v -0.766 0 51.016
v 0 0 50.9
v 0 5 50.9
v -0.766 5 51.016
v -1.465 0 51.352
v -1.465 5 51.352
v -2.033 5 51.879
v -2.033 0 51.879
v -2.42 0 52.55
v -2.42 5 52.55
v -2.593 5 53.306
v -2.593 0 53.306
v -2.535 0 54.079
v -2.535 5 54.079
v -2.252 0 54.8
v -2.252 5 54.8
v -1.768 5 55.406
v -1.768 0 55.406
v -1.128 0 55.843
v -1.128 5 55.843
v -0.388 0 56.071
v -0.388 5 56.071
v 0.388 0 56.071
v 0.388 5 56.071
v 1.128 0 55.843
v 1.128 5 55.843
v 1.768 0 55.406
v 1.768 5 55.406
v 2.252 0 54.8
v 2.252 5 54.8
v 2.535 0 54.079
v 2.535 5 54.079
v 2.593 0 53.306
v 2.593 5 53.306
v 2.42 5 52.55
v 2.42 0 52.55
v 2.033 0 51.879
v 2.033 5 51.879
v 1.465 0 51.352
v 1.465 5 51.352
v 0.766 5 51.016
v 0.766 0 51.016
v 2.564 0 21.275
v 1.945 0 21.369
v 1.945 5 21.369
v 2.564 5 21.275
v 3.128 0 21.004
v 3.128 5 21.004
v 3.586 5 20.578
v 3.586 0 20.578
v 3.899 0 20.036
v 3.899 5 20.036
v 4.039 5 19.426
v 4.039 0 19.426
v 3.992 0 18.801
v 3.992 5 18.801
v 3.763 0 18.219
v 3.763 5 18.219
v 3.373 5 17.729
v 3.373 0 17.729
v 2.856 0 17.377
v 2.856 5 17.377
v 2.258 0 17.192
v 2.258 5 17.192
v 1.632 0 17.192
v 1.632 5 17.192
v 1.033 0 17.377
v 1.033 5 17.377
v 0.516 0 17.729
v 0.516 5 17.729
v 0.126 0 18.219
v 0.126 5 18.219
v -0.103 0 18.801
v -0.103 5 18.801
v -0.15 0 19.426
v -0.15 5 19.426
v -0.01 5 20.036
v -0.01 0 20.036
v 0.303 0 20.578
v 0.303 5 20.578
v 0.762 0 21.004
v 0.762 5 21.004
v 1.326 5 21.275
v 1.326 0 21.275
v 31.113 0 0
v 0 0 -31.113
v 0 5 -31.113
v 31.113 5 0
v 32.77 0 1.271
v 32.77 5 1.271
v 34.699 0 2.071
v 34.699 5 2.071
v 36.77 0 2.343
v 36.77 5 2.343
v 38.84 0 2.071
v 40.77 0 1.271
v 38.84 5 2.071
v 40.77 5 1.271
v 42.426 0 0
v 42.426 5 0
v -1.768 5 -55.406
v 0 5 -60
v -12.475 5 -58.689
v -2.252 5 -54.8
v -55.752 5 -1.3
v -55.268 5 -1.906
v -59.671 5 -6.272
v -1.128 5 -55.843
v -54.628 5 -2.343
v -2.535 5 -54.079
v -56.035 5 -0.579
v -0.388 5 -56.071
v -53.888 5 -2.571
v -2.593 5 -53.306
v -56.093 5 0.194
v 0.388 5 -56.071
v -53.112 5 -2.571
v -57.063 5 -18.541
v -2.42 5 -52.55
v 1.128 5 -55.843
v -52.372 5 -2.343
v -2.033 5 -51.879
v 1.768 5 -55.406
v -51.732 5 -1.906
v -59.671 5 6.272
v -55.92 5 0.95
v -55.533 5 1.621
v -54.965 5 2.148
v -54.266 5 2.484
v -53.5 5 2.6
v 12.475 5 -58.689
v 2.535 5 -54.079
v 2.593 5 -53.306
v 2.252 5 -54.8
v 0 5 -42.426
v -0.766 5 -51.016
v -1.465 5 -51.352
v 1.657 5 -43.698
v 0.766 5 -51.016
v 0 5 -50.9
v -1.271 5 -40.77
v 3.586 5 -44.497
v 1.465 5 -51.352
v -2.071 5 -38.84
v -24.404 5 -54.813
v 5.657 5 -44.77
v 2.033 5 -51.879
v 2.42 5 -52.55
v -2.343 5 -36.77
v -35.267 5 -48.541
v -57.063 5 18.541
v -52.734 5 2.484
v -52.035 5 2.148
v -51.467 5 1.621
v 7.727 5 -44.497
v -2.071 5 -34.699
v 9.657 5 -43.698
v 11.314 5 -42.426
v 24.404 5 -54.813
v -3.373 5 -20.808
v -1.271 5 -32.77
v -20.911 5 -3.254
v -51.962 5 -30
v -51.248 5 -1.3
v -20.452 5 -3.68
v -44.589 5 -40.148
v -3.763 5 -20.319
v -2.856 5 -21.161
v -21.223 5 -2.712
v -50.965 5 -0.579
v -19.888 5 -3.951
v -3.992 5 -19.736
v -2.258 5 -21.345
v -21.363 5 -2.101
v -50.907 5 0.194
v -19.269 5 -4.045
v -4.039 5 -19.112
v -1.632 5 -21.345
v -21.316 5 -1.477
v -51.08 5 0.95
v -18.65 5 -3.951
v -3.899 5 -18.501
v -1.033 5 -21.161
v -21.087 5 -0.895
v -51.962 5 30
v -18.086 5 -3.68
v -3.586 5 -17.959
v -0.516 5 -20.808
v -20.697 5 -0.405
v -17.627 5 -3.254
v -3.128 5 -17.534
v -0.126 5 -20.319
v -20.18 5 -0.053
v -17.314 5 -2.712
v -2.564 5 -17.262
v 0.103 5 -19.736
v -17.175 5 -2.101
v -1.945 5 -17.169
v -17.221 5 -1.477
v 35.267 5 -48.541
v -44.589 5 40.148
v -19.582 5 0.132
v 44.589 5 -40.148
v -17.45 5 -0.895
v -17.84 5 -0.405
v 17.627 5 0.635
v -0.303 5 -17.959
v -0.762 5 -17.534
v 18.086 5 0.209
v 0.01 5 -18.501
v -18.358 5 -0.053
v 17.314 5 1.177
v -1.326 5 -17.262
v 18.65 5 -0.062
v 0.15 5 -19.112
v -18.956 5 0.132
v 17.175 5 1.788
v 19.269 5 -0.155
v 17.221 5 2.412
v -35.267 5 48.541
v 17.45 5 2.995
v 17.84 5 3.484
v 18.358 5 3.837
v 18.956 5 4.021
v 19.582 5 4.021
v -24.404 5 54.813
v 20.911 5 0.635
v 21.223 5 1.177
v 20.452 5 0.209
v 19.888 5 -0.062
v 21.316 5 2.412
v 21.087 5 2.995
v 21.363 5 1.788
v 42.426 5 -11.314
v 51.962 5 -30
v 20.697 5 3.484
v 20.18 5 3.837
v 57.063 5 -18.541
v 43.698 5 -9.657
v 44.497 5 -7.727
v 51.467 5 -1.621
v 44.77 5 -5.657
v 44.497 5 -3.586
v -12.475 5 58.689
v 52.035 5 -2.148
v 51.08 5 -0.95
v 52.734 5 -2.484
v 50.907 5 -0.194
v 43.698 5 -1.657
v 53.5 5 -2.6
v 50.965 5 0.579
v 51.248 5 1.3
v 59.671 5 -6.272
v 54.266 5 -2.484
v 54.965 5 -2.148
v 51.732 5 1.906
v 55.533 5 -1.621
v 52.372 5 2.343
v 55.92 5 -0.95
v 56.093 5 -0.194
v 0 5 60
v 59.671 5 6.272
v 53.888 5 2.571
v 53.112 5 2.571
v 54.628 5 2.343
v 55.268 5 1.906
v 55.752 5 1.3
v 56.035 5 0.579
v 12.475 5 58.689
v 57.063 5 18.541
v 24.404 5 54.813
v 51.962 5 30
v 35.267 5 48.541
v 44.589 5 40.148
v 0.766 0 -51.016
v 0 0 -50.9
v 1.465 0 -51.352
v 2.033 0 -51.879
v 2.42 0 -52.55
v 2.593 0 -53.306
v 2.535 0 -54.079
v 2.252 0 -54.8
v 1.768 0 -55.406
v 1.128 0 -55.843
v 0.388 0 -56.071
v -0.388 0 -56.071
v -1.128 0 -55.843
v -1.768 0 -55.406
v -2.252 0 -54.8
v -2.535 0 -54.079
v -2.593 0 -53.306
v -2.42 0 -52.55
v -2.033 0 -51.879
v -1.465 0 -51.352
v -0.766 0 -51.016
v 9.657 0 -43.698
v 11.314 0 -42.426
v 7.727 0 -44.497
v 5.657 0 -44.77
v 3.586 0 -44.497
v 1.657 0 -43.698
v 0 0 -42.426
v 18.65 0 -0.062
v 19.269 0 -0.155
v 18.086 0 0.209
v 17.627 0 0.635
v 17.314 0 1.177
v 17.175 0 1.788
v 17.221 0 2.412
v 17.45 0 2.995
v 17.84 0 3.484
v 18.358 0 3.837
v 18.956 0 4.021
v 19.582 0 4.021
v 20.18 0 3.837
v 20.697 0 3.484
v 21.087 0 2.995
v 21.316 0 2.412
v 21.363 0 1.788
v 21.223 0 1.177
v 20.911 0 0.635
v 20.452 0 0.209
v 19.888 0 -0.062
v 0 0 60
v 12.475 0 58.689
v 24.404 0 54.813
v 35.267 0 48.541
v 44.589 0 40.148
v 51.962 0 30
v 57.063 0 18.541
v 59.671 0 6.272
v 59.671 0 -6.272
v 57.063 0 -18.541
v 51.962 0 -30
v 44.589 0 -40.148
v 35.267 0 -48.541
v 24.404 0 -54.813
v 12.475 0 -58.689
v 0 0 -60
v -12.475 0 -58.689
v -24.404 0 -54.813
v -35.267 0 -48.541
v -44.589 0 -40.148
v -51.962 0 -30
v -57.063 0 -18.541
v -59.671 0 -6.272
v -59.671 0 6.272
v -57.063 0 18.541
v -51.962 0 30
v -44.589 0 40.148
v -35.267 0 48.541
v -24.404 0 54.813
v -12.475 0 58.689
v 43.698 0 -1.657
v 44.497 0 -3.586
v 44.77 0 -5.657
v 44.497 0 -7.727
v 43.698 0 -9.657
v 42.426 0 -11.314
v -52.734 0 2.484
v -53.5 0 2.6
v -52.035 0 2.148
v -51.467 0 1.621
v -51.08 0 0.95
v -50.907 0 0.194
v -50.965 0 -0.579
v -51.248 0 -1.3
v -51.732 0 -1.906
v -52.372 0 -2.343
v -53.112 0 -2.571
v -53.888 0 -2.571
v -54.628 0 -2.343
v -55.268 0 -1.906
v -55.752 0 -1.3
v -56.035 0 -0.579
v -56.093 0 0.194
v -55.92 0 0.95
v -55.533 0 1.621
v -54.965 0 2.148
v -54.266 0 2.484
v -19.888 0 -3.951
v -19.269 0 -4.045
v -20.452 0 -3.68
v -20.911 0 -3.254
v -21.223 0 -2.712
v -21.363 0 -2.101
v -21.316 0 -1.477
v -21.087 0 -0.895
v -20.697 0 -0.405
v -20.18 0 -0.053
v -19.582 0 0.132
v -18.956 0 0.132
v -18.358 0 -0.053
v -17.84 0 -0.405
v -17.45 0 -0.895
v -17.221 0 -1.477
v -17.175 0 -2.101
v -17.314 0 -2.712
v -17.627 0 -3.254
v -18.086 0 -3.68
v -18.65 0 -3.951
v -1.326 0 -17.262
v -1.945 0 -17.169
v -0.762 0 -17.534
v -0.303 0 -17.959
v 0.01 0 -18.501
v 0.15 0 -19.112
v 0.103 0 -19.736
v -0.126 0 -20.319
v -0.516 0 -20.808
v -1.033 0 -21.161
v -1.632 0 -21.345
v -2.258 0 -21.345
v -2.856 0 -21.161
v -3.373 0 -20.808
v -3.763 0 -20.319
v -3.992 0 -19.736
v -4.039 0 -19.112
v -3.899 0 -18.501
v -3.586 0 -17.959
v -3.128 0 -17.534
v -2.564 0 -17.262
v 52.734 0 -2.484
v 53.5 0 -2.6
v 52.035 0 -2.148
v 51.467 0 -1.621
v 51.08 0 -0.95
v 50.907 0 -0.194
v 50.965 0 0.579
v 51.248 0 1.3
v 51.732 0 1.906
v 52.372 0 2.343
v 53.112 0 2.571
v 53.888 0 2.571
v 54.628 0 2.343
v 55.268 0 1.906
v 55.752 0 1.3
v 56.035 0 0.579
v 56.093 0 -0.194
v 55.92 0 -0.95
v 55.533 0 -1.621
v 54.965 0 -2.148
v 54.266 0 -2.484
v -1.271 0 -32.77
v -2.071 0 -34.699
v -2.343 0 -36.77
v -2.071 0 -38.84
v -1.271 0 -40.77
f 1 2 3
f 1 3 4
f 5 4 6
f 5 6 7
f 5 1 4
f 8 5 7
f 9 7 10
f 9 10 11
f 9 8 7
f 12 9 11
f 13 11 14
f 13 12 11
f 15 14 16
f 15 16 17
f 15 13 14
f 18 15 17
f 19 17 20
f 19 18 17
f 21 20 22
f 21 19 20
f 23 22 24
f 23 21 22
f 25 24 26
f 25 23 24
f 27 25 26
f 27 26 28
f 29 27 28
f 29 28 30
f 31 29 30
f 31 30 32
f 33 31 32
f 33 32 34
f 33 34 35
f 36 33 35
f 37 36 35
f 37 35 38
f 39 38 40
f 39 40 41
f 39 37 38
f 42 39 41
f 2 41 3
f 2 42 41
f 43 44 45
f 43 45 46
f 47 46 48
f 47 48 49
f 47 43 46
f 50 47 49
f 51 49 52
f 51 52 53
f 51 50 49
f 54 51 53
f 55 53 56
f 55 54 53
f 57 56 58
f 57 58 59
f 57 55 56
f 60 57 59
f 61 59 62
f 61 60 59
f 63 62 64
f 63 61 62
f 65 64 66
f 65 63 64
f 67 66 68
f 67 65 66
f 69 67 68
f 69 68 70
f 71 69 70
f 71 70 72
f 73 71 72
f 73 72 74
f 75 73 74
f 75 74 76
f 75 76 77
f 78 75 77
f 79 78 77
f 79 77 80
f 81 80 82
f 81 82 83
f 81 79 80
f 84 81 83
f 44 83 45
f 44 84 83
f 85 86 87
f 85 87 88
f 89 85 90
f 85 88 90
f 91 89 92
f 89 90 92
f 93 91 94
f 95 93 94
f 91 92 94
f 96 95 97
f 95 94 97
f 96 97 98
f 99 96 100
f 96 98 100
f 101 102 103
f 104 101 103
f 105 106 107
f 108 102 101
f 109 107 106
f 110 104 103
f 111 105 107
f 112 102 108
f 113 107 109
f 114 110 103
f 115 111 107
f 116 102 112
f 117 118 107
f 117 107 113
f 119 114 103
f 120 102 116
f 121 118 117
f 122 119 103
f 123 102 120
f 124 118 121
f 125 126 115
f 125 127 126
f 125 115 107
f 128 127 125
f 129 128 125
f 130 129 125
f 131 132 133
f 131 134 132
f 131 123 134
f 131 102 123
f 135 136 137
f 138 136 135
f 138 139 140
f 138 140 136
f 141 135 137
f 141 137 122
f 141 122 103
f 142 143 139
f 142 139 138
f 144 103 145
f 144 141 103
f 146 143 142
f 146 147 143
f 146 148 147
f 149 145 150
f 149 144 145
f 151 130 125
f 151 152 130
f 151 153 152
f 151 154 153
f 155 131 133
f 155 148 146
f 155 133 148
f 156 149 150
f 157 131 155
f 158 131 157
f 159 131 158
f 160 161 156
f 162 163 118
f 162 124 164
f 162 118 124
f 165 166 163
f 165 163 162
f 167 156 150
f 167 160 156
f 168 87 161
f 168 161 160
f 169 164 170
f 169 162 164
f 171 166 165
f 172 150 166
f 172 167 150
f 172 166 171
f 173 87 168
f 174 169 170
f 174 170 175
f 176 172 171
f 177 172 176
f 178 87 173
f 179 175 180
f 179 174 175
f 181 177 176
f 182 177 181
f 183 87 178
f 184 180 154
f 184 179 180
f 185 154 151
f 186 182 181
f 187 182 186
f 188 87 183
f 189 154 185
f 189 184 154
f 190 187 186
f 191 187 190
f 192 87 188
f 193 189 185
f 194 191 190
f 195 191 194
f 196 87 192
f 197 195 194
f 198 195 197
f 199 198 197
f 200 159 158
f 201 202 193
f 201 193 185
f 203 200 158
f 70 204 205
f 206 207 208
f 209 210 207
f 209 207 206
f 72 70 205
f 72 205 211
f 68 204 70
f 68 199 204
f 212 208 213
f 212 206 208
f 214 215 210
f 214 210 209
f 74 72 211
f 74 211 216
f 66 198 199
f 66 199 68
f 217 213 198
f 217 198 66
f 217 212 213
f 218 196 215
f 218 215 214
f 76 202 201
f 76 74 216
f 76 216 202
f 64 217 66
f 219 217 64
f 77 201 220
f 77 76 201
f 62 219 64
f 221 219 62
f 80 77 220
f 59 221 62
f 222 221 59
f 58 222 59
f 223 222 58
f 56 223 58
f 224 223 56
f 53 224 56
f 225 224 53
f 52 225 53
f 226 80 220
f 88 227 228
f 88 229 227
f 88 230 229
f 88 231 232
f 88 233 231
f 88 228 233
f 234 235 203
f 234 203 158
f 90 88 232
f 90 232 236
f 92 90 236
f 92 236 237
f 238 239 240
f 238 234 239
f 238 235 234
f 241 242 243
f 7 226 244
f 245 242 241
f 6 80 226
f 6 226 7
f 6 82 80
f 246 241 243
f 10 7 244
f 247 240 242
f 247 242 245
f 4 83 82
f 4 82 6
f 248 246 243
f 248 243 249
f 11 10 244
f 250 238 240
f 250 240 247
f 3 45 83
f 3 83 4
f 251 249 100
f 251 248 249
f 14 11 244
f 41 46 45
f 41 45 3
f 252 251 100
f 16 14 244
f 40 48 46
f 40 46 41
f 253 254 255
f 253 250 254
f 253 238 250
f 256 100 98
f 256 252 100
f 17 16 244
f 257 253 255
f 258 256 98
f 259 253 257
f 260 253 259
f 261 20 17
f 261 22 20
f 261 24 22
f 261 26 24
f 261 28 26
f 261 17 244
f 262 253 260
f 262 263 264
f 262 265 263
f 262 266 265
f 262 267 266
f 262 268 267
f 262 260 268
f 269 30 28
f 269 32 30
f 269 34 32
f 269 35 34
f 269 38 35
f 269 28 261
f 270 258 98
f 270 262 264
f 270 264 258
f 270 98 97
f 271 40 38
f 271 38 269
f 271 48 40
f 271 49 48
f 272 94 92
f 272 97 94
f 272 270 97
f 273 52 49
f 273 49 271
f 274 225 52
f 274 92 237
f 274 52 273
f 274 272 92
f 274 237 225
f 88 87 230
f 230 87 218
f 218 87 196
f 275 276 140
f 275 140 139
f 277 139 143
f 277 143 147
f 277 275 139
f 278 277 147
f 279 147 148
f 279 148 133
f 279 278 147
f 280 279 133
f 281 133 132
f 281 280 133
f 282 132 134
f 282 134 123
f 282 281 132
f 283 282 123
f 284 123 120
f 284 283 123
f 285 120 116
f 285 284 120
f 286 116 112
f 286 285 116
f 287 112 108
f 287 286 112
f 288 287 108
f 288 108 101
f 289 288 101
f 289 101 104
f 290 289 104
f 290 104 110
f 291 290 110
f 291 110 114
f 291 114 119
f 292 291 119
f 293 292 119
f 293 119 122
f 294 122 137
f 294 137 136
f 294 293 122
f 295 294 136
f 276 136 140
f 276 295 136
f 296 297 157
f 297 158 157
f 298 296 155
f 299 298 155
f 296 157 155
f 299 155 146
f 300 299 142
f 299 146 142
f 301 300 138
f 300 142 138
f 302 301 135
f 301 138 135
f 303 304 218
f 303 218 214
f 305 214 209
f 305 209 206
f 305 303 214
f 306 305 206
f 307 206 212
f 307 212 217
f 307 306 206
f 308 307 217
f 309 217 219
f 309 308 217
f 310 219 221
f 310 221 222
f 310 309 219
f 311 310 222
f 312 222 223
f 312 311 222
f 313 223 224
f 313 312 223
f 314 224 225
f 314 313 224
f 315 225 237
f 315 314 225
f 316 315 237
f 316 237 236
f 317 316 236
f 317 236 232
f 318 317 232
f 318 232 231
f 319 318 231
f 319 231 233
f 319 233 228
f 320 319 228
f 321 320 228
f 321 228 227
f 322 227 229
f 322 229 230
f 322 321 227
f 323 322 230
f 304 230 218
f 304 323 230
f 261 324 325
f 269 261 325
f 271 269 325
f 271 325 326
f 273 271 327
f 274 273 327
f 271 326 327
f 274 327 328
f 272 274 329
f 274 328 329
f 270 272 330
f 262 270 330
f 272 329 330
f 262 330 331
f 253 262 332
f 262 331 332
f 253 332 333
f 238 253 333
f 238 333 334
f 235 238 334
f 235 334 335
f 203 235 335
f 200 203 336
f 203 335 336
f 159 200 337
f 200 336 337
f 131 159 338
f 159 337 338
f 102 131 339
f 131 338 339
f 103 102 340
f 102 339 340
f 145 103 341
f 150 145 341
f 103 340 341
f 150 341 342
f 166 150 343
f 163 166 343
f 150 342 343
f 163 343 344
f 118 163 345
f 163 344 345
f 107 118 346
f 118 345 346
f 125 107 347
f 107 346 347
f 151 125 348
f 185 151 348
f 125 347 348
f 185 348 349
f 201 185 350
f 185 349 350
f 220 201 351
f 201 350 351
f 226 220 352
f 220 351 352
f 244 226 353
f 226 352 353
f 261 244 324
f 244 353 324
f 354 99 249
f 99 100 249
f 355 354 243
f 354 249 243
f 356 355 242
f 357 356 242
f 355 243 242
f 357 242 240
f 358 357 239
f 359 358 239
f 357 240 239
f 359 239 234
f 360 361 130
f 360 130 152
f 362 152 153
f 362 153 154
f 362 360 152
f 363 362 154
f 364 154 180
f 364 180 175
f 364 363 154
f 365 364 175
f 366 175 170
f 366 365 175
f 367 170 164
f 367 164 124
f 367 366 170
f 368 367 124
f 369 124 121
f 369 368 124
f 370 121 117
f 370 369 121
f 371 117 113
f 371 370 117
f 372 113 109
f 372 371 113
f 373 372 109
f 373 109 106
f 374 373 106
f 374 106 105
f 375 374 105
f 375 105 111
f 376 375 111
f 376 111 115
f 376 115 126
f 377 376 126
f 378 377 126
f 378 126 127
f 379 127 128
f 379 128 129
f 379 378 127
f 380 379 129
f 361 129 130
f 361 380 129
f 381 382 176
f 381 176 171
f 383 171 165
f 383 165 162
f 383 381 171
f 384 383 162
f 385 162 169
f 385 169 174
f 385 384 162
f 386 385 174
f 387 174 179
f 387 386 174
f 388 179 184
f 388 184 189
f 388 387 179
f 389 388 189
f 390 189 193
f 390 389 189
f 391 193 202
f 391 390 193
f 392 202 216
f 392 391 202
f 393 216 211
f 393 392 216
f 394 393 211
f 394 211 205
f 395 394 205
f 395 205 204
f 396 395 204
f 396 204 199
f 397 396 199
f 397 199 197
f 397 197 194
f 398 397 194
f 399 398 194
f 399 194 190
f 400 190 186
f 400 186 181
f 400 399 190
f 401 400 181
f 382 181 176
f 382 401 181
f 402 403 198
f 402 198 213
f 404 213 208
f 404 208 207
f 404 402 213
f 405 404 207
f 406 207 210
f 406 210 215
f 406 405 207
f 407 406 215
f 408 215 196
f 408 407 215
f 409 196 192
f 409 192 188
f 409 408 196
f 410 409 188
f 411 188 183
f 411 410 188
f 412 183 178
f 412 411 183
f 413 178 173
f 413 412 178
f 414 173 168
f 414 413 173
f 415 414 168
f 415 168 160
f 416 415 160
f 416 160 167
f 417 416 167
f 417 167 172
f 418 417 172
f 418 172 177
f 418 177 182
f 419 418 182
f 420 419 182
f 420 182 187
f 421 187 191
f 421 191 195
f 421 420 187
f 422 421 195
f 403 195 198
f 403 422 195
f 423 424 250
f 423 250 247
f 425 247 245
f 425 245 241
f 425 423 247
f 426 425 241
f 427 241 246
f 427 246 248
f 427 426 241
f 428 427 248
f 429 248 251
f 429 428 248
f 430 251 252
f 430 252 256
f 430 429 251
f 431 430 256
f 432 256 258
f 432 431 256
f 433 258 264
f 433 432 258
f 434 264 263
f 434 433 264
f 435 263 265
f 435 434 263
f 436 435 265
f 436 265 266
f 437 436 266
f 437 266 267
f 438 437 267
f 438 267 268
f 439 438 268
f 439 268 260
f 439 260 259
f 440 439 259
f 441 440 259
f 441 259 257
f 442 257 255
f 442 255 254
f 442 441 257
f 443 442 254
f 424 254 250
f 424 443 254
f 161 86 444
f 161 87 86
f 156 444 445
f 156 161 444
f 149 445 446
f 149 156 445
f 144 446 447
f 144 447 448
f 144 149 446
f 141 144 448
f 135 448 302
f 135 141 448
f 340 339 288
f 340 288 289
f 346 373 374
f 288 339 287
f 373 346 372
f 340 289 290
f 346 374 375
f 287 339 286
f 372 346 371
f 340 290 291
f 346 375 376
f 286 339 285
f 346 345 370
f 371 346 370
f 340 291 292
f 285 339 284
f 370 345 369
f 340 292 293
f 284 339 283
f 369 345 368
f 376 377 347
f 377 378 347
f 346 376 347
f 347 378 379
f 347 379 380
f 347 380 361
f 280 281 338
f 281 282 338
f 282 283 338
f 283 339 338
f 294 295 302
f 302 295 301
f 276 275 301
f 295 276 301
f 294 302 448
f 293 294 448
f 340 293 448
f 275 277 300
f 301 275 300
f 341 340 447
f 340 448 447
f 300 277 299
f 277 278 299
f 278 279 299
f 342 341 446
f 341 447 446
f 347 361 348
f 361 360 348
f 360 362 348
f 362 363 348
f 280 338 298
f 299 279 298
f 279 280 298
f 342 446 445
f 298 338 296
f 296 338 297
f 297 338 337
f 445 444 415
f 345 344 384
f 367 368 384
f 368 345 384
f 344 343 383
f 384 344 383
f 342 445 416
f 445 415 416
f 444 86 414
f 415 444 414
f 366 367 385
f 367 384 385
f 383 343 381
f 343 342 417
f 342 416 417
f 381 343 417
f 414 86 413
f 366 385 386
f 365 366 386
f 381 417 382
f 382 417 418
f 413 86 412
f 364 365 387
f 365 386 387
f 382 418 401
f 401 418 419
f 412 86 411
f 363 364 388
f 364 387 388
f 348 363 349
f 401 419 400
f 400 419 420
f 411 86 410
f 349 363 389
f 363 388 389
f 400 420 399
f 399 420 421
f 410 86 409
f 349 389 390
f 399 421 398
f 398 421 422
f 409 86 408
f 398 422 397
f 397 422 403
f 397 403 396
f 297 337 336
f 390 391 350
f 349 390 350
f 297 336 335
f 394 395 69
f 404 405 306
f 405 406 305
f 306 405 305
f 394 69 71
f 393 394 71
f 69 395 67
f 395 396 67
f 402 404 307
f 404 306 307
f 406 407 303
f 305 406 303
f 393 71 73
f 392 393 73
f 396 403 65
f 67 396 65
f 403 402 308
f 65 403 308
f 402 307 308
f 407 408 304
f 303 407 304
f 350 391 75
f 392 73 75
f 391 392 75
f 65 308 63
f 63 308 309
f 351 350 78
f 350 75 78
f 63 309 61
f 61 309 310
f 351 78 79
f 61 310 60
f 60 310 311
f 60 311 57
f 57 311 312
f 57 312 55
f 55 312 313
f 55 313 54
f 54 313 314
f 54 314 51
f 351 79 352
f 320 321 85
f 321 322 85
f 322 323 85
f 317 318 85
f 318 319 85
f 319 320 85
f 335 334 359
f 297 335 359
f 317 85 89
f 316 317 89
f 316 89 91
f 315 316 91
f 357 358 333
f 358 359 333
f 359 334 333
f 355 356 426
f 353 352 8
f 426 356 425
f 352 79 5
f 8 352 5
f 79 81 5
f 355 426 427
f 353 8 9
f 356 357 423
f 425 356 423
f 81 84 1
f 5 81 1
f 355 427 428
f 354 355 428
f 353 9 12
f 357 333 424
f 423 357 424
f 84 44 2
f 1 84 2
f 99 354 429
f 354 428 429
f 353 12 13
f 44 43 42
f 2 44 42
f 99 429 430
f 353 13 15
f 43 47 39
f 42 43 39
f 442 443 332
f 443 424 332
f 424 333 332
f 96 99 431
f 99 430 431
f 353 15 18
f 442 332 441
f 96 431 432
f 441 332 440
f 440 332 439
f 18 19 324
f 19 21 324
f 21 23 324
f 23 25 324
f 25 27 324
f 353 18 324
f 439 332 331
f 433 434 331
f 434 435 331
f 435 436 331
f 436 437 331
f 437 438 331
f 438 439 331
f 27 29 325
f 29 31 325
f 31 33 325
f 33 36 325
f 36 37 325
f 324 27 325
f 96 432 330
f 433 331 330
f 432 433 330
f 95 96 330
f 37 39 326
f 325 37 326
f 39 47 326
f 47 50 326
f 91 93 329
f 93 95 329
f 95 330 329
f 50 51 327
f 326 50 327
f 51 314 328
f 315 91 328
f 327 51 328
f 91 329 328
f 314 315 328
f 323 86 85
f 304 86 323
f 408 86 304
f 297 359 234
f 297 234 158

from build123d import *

# Parameters (mm, degrees)
SKETCH_1_R      = 60
SKETCH_1_R_2    = 2.6
SKETCH_1_R_3    = 2.1
EXTRUDE_1_DEPTH = 5
FILLET_1_R      = 8


with BuildPart() as part:
    # 草图1 → 凸台-拉伸1 (new body)
    with BuildSketch(Plane(origin=(0, 0, 0), x_dir=(1, 0, 0), z_dir=(0, 1, 0))):
        with Locations(Location((0, 0, 0), (0, 0, 270))):
            Circle(SKETCH_1_R)
        with Locations(Location((0, 53.5, 0), (0, 0, 270))):
            Circle(SKETCH_1_R_2, mode=Mode.SUBTRACT)
        with Locations(Location((53.5, 0, 0), (0, 0, 90))):
            Circle(SKETCH_1_R_2, mode=Mode.SUBTRACT)
        with Locations(Location((0, -53.5, 0), (0, 0, 90))):
            Circle(SKETCH_1_R_2, mode=Mode.SUBTRACT)
        with Locations(Location((-53.5, 0, 0), (0, 0, 270))):
            Circle(SKETCH_1_R_2, mode=Mode.SUBTRACT)
        with Locations(Location((-1.944543648, 19.268659787, 0), (0, 0, 270))):
            Circle(SKETCH_1_R_3, mode=Mode.SUBTRACT)
        with Locations(Location((19.268659787, -1.944543648, 0), (0, 0, 90))):
            Circle(SKETCH_1_R_3, mode=Mode.SUBTRACT)
        with Locations(Location((1.944543648, -19.268659787, 0), (0, 0, 270))):
            Circle(SKETCH_1_R_3, mode=Mode.SUBTRACT)
        with Locations(Location((-19.268659787, 1.944543648, 0), (0, 0, 90))):
            Circle(SKETCH_1_R_3, mode=Mode.SUBTRACT)
        Polygon((-5.656854249, 36.769552622), (36.769552622, -5.656854249), (48.083261121, 5.656854249), (5.656854249, 48.083261121), align=None, mode=Mode.SUBTRACT)
    extrude(amount=EXTRUDE_1_DEPTH)

    # 圆角1
    fillet_1_edges = [part.edges().sort_by_distance(p)[0] for p in [
        (36.769552622, 2.5, 5.656854249),
        (48.083261121, 2.5, -5.656854249),
        (5.656854249, 2.5, -48.083261121),
        (-5.656854249, 2.5, -36.769552622),
    ]]
    fillet(fillet_1_edges, radius=FILLET_1_R - 0.0001)  # a hair under: the kernel refuses the full size


solid = part.part
